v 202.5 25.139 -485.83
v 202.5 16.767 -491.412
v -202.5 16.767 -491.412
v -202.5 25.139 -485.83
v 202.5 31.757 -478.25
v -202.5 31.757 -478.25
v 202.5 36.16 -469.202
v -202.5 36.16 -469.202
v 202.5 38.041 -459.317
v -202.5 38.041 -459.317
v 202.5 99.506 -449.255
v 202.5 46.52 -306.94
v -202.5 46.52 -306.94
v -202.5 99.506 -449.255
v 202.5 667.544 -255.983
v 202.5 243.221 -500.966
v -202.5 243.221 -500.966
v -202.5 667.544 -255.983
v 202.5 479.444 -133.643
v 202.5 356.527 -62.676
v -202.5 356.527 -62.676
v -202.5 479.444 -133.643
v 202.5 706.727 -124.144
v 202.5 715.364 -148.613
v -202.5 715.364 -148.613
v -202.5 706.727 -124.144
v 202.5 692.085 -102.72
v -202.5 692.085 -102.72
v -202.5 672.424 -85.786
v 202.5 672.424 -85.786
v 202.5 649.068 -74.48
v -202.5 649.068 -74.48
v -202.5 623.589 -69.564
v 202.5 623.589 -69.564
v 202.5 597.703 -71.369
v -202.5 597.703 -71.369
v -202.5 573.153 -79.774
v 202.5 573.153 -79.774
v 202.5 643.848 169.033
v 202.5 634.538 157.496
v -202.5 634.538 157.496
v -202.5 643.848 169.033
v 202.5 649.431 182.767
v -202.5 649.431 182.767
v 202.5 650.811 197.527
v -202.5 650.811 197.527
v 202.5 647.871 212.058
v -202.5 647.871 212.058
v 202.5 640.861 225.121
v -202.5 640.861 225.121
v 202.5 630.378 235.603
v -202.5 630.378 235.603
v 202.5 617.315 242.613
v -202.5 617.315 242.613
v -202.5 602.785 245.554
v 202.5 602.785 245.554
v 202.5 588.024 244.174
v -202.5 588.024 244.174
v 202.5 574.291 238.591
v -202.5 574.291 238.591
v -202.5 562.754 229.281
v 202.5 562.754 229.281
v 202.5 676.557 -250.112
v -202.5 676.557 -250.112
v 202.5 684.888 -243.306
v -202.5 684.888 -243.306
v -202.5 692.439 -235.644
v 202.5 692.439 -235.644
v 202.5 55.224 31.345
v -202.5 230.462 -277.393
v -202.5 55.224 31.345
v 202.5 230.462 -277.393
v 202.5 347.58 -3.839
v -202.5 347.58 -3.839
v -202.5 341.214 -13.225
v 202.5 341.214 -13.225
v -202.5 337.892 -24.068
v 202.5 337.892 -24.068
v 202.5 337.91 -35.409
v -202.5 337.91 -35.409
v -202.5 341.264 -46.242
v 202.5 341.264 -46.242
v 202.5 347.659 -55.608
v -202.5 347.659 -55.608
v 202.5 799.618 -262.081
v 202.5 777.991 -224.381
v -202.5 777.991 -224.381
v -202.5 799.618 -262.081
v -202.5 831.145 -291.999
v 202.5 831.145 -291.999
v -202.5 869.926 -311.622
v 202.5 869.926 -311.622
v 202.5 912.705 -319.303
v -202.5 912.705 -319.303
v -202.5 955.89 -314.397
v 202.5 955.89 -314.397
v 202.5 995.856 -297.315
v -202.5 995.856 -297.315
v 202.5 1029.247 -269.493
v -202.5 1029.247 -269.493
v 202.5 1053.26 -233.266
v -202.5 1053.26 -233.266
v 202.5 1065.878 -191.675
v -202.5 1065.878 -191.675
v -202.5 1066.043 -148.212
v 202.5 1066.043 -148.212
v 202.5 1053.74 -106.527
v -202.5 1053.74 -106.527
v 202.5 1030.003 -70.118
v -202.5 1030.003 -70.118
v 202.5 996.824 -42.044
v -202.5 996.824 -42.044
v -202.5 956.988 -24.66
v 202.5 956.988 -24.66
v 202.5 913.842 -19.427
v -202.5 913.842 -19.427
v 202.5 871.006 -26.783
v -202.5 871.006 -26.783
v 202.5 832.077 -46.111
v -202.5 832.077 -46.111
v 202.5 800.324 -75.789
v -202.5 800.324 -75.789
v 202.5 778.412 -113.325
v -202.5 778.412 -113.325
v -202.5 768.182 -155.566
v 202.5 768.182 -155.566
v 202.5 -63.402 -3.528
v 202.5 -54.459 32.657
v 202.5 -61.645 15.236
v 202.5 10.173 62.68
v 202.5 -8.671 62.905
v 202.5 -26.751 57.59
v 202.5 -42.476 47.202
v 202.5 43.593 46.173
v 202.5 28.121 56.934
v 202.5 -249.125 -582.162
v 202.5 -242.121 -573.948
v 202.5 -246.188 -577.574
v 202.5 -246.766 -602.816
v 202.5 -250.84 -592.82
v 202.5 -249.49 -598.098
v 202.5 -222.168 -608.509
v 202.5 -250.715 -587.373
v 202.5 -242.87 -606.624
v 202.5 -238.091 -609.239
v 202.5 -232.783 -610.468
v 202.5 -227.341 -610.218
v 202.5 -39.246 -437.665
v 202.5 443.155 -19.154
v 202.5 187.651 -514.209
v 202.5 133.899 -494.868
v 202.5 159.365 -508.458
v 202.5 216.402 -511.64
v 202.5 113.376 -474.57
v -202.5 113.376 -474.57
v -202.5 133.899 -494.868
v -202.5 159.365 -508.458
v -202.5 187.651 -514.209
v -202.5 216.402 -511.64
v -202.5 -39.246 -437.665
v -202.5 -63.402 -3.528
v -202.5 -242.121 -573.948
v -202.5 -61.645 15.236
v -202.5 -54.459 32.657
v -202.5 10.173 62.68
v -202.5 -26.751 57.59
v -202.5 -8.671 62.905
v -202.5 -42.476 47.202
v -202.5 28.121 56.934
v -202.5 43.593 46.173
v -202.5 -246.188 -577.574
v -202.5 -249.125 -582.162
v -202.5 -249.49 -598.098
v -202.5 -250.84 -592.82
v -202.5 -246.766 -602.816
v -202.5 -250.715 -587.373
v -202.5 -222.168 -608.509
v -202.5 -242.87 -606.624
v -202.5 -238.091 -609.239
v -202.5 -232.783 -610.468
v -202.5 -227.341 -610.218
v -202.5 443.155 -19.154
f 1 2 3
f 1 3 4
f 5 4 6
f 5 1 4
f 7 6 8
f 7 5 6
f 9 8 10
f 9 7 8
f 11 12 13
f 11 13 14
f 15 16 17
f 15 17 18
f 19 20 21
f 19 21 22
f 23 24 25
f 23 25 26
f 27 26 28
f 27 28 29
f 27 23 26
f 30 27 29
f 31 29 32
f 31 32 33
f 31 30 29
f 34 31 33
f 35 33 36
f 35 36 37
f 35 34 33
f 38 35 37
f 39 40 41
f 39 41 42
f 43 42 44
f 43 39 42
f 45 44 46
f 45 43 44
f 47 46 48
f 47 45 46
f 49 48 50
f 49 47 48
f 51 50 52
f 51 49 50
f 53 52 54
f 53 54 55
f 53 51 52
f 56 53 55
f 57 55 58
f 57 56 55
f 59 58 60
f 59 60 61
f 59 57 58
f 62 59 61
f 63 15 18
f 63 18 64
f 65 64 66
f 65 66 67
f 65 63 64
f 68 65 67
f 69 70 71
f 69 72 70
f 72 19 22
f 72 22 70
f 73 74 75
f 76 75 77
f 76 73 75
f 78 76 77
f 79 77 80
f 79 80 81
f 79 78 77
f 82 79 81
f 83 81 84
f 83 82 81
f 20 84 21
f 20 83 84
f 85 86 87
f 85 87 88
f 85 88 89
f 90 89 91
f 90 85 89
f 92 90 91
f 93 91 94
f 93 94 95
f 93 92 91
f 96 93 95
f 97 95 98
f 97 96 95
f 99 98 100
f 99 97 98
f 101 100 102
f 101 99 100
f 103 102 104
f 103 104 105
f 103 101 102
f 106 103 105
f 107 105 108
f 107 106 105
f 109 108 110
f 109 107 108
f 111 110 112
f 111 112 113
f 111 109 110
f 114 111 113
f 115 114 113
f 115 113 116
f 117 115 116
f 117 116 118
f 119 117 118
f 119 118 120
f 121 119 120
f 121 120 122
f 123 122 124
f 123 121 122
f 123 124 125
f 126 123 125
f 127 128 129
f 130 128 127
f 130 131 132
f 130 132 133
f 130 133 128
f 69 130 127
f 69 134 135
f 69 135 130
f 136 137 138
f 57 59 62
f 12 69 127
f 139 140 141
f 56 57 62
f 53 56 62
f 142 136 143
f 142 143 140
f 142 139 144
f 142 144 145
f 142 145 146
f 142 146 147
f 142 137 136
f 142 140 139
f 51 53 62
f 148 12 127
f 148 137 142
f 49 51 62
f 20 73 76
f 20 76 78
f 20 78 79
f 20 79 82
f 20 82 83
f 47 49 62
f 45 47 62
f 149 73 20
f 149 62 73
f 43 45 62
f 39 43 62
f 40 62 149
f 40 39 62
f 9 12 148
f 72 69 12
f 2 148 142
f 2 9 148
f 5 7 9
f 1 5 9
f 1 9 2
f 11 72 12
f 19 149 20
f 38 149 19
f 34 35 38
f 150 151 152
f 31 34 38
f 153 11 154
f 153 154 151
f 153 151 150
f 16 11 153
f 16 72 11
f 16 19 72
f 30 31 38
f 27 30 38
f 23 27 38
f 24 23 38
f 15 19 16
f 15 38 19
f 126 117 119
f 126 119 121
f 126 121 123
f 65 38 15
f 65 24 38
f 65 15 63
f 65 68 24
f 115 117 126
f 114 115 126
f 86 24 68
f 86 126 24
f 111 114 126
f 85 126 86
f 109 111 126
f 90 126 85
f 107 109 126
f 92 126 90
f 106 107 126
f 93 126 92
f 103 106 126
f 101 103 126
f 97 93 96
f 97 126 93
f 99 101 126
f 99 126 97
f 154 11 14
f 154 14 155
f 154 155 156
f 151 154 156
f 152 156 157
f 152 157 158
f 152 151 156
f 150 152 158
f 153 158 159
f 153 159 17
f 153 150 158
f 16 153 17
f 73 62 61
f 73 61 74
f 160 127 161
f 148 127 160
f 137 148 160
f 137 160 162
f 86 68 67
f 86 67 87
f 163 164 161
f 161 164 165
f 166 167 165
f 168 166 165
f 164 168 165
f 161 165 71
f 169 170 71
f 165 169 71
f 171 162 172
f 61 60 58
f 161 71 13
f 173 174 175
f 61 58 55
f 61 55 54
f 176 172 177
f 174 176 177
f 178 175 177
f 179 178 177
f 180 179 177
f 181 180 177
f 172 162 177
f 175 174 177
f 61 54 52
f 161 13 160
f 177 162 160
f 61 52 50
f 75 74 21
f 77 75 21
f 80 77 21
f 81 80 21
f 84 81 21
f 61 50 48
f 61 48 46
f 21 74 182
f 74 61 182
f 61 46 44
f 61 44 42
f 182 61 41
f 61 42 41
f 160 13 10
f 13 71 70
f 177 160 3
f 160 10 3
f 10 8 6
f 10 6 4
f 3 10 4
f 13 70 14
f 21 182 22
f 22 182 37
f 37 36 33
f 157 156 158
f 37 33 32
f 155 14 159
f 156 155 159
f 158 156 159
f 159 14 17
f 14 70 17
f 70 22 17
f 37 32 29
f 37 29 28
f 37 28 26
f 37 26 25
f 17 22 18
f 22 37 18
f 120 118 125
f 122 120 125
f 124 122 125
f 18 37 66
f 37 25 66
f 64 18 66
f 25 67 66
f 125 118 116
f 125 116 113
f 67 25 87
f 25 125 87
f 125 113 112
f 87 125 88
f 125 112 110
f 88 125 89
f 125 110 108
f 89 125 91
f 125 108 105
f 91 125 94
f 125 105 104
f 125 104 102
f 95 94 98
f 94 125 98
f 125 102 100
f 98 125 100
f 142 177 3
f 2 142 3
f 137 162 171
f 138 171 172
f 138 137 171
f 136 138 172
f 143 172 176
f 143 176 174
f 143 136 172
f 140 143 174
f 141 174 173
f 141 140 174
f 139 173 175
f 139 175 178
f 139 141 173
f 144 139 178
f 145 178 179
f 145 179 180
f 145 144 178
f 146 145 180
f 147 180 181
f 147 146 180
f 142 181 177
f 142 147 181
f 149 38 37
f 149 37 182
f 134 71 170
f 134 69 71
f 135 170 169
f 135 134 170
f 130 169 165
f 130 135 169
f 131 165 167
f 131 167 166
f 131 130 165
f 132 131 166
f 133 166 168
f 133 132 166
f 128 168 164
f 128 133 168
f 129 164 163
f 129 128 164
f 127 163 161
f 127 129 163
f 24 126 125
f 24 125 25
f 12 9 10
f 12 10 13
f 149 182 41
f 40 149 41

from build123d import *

# Parameters (mm, degrees)
SKETCH2_R           = 150
SKETCH2_R_2         = 100
SKETCH2_R_3         = 38.1
SKETCH2_R_4         = 50.8
SKETCH2_R_5         = 63.5
SKETCH2_R_6         = 20
BOSS_EXTRUDE1_DEPTH = 202.5


with BuildPart() as part:
    # Sketch2 → Boss-Extrude1 (new, symmetric)
    with BuildSketch(Plane(origin=(0, 0, 0), x_dir=(0, 0, -1), z_dir=(1, 0, 0))):
        with Locations((169.380920233, 917.544072258)):
            Circle(SKETCH2_R)
        with BuildLine():
            ThreePointArc((148.612903403, 715.363750631), (194.853343441, 714.245445857), (235.644139642, 692.438569744))
            Line((235.644139642, 692.438569744), (224.380920233, 777.991214889))
            ThreePointArc((224.380920233, 777.991214889), (190.549773257, 769.045319194), (155.566499173, 768.1815543))
            Line((155.566499173, 768.1815543), (148.612903403, 715.363750631))
        make_face()
        with Locations((169.380920233, 617.544072258)):
            Circle(SKETCH2_R_2)
        with BuildLine():
            Line((133.64293857, 479.444072258), (156.147736241, 518.423525239))
            ThreePointArc((156.147736241, 518.423525239), (113.74819605, 534.447742616), (82.778379855, 567.544072258))
            Line((82.778379855, 567.544072258), (133.64293857, 479.444072258))
        make_face()
        with BuildLine():
            Line((62.676488117, 356.526574441), (133.64293857, 479.444072258))
            Line((133.64293857, 479.444072258), (82.778379855, 567.544072258))
            ThreePointArc((82.778379855, 567.544072258), (81.231422133, 570.324733162), (79.773717129, 573.15320437))
            Line((79.773717129, 573.15320437), (19.154340526, 443.154531728))
            Line((19.154340526, 443.154531728), (57.677758088, 401.418150827))
            ThreePointArc((57.677758088, 401.418150827), (65.165350074, 389.449758606), (67.780920233, 375.576574441))
            ThreePointArc((67.780920233, 375.576574441), (66.482694215, 365.715568823), (62.676488117, 356.526574441))
        make_face()
        with Locations((29.680920233, 375.576574441)):
            Circle(SKETCH2_R_3)
        with BuildLine():
            Line((57.677758088, 401.418150827), (19.154340526, 443.154531728))
            Line((19.154340526, 443.154531728), (-4.849406453, 391.678330213))
            ThreePointArc((-4.849406453, 391.678330213), (23.816822223, 413.222588234), (57.677758088, 401.418150827))
        make_face()
        with BuildLine():
            Line((-4.849406453, 391.678330213), (19.154340526, 443.154531728))
            Line((19.154340526, 443.154531728), (-157.496365653, 634.538412649))
            ThreePointArc((-157.496365653, 634.538412649), (-147.512909672, 618.580556354), (-144.025482794, 600.082977468))
            ThreePointArc((-144.025482794, 600.082977468), (-174.45020497, 553.548172713), (-229.280917975, 562.753860328))
            Line((-229.280917975, 562.753860328), (3.839343847, 347.579736586))
            ThreePointArc((3.839343847, 347.579736586), (-7.700400772, 368.211329036), (-4.849406453, 391.678330213))
        make_face()
        with Locations((-194.825482794, 600.082977468)):
            Circle(SKETCH2_R_4)
        with BuildLine():
            ThreePointArc((365.001588936, 280.188650866), (440.600513293, 289.717914732), (500.966460612, 243.221069268))
            Line((500.966460612, 243.221069268), (255.983460612, 667.544072258))
            ThreePointArc((255.983460612, 667.544072258), (265.973502862, 643.425976769), (269.380920233, 617.544072258))
            ThreePointArc((269.380920233, 617.544072258), (235.247002555, 542.300074494), (156.147736241, 518.423525239))
            Line((156.147736241, 518.423525239), (133.64293857, 479.444072258))
            Line((133.64293857, 479.444072258), (277.392641257, 230.462283632))
            Line((277.392641257, 230.462283632), (365.001588936, 280.188650866))
        make_face()
        with BuildLine():
            ThreePointArc((327.761379855, 143.221069268), (317.867074769, 219.457662328), (365.001588936, 280.188650866))
            Line((365.001588936, 280.188650866), (277.392641257, 230.462283632))
            Line((277.392641257, 230.462283632), (327.761379855, 143.221069268))
        make_face()
        with Locations((414.363920233, 193.221069268)):
            Circle(SKETCH2_R_2)
        with BuildLine():
            Line((306.939939608, 46.519626158), (449.255457905, 99.505645783))
            ThreePointArc((449.255457905, 99.505645783), (380.507362333, 99.126789489), (327.761379855, 143.221069268))
            Line((327.761379855, 143.221069268), (277.392641257, 230.462283632))
            Line((277.392641257, 230.462283632), (-31.345080373, 55.224414315))
            ThreePointArc((-31.345080373, 55.224414315), (-14.497190191, 61.822985018), (3.527777778, 63.401930443))
            Line((3.527777778, 63.401930443), (306.939939608, 46.519626158))
        make_face()
        Circle(SKETCH2_R_5)
        with BuildLine():
            Line((22.156126422, -59.509293913), (306.939939608, 46.519626158))
            Line((306.939939608, 46.519626158), (3.527777778, 63.401930443))
            ThreePointArc((3.527777778, 63.401930443), (46.131680486, 43.636201204), (63.5, 0))
            ThreePointArc((63.5, 0), (52.149611829, -36.23076022), (22.156126422, -59.509293913))
        make_face()
        with BuildLine():
            Line((459.316666667, 38.041158266), (306.939939608, 46.519626158))
            Line((306.939939608, 46.519626158), (22.156126422, -59.509293913))
            ThreePointArc((22.156126422, -59.509293913), (12.988606104, -62.157430059), (3.527777778, -63.401930443))
            Line((3.527777778, -63.401930443), (437.66530145, -39.245872453))
            Line((437.66530145, -39.245872453), (425.573363507, -21.24537277))
            ThreePointArc((425.573363507, -21.24537277), (424.087573777, 18.846146281), (459.316666667, 38.041158266))
        make_face()
        with Locations((457.2, 0)):
            Circle(SKETCH2_R_3)
        with BuildLine():
            Line((608.509239254, -222.167513639), (491.412350778, 16.766784254))
            ThreePointArc((491.412350778, 16.766784254), (494.315364505, 8.605795586), (495.3, 0))
            ThreePointArc((495.3, 0), (484.879008291, -26.181720723), (459.316666667, -38.041158266))
            Line((459.316666667, -38.041158266), (437.66530145, -39.245872453))
            Line((437.66530145, -39.245872453), (573.94809108, -242.12140184))
            ThreePointArc((573.94809108, -242.12140184), (580.55, -213.648467114), (608.509239254, -222.167513639))
        make_face()
        with Locations((590.55, -230.968975189)):
            Circle(SKETCH2_R_6)
        with BuildLine():
            ThreePointArc((459.316666667, -38.041158266), (440.222538989, -34.108295437), (425.573363507, -21.24537277))
            Line((425.573363507, -21.24537277), (437.66530145, -39.245872453))
            Line((437.66530145, -39.245872453), (459.316666667, -38.041158266))
        make_face()
    extrude(amount=BOSS_EXTRUDE1_DEPTH, both=True)


solid = part.part
